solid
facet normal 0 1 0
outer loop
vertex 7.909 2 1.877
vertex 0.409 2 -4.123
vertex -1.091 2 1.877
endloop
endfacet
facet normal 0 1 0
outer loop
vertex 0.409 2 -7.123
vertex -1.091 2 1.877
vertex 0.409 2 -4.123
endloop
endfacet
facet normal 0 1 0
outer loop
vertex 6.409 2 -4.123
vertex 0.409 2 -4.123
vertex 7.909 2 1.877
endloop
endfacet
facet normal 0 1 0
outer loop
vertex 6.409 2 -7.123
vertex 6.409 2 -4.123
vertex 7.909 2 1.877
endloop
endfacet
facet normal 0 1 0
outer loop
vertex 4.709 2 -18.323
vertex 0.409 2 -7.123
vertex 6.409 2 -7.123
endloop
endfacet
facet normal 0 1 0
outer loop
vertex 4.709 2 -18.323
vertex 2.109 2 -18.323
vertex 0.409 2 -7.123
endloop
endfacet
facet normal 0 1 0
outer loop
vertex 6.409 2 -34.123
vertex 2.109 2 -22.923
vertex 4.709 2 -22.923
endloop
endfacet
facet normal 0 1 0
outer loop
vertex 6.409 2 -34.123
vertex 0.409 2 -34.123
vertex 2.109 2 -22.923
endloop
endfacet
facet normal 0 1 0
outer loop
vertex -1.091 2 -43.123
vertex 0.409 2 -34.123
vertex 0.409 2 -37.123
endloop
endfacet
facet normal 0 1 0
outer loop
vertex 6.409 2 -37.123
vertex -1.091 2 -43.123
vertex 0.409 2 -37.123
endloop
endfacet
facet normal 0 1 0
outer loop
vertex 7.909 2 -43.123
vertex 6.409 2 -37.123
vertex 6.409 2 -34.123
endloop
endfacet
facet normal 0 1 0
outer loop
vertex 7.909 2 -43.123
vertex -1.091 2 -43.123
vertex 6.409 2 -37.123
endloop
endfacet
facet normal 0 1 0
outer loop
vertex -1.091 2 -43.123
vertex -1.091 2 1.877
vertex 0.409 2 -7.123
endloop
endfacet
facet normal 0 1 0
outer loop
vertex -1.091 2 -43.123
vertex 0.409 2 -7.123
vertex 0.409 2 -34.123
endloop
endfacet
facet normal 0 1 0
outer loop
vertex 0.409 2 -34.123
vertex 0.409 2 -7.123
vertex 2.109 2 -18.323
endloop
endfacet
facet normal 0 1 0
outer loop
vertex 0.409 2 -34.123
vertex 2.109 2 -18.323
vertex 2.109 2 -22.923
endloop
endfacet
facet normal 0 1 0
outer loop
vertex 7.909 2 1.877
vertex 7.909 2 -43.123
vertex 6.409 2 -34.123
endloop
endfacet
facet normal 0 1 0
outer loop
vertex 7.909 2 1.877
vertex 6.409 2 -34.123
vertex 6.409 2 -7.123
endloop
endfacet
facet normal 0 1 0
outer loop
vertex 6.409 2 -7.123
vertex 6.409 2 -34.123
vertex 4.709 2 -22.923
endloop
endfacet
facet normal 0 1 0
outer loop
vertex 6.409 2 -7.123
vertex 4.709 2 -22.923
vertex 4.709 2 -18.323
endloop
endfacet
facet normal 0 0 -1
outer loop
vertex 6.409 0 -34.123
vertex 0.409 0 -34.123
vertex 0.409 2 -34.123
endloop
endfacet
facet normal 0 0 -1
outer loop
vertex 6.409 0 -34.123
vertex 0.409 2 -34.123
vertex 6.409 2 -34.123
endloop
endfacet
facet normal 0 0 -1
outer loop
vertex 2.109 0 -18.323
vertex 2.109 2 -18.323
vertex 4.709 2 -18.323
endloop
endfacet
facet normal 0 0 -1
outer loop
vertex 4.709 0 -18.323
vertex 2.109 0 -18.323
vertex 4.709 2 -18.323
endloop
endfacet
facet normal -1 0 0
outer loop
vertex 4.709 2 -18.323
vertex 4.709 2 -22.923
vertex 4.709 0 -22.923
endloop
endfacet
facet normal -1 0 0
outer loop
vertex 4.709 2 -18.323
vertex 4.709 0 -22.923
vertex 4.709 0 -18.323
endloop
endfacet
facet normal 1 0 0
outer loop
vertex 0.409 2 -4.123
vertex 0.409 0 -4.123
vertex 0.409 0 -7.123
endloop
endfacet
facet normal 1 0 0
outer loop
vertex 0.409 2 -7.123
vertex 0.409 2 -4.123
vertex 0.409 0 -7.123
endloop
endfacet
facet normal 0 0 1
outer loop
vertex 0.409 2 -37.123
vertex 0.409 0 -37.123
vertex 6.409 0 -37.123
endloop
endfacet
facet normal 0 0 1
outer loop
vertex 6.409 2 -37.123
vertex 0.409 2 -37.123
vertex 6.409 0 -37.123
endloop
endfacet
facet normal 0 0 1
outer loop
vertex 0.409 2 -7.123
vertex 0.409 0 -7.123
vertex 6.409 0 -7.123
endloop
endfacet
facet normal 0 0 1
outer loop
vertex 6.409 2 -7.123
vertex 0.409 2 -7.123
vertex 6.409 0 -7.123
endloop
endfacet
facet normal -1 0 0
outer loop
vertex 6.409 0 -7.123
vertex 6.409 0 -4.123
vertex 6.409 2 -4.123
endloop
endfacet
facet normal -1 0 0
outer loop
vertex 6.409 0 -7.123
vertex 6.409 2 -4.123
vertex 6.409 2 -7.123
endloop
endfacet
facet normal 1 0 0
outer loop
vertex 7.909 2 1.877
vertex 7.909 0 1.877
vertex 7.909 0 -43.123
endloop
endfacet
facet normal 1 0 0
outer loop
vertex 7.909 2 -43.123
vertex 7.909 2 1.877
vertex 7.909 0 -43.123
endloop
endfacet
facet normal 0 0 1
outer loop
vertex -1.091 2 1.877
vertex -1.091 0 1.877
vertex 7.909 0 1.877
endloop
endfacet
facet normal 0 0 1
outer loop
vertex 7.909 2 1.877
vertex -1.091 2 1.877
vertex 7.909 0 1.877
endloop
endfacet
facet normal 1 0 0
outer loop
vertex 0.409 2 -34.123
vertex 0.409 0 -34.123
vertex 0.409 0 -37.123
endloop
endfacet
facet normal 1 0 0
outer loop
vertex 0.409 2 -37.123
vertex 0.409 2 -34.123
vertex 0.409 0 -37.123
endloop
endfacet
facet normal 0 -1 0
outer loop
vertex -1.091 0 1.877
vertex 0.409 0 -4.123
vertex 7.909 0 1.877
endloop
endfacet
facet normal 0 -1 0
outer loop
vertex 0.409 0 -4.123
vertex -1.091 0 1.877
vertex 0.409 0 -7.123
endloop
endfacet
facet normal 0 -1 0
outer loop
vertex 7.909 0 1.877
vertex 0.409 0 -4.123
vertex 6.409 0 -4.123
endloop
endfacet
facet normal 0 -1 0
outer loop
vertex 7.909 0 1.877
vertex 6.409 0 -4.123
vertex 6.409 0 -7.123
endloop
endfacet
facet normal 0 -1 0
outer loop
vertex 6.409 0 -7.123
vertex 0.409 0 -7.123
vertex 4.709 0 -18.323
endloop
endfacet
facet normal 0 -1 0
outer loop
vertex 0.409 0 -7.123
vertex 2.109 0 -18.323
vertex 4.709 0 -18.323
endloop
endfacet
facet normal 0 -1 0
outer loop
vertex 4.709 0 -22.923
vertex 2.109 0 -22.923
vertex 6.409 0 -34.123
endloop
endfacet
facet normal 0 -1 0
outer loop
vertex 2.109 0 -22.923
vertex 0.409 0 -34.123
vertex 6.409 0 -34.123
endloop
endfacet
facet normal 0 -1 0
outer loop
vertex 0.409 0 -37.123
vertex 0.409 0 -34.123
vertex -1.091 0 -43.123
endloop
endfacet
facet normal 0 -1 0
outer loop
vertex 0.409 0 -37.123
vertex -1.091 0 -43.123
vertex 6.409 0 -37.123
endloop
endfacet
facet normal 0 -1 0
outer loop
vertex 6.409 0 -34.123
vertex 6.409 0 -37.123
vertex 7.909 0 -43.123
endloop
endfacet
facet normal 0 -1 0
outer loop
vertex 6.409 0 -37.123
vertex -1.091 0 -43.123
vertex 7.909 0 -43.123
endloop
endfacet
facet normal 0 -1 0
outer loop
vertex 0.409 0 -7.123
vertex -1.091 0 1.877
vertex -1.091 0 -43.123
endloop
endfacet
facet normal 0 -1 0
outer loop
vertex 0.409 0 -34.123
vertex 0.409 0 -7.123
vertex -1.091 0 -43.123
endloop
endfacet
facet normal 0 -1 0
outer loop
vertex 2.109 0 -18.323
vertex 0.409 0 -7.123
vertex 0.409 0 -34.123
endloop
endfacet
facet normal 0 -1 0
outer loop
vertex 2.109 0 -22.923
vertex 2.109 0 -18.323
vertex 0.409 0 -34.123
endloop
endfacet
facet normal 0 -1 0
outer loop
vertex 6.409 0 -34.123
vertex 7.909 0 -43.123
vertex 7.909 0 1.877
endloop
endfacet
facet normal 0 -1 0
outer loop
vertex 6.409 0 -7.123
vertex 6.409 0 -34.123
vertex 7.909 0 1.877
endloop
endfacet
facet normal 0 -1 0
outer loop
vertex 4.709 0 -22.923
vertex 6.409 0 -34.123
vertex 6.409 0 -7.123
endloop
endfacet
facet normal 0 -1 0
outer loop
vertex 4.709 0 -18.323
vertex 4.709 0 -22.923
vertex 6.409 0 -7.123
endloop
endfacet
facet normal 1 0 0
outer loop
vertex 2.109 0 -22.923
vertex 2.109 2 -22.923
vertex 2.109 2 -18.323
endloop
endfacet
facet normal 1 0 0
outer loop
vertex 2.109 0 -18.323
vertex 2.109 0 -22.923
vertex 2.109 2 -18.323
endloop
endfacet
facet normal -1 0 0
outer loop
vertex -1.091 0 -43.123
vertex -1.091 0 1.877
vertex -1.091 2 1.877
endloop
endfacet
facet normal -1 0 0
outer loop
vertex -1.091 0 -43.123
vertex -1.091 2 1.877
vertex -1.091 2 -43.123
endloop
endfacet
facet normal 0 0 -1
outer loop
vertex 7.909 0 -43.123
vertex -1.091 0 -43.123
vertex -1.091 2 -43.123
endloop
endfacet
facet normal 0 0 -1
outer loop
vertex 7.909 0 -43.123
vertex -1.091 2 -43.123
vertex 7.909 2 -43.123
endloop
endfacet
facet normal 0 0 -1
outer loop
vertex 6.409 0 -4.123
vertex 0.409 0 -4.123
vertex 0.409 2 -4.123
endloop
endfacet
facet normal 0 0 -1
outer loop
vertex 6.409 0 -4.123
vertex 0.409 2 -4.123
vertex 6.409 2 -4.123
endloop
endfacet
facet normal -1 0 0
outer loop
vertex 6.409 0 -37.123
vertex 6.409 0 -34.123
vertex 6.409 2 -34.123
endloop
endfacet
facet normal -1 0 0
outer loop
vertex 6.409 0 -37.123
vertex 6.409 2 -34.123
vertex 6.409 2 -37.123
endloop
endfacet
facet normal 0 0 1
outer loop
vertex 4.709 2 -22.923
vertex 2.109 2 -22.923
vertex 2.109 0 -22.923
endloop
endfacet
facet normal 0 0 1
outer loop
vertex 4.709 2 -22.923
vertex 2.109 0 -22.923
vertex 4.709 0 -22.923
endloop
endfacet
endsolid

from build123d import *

# Parameters (mm, degrees)
ESQUISSE1_W                  = 9
ESQUISSE1_H                  = 45
ESQUISSE1_W_2                = 6
ESQUISSE1_H_2                = 3
BOSS_EXTRU_1_DEPTH           = 2
ENL_V_MAT_EXTRU_1_DEPTH      = 44.887394917
ENL_V_MAT_EXTRU_1_DEPTH_BACK = 44.887394917
ESQUISSE2_W                  = 2.6
ESQUISSE2_H                  = 4.6


with BuildPart() as part:
    # Esquisse1 → Boss.-Extru.1 (new body)
    with BuildSketch(Plane(origin=(0, 0, 0), x_dir=(1, 0, 0), z_dir=(0, 1, 0))):
        with Locations((3.408982136, 20.622516556)):
            Rectangle(ESQUISSE1_W, ESQUISSE1_H)
        with Locations((3.408982136, 35.622516556)):
            Rectangle(ESQUISSE1_W_2, ESQUISSE1_H_2, mode=Mode.SUBTRACT)
        with Locations((3.408982136, 5.622516556)):
            Rectangle(ESQUISSE1_W_2, ESQUISSE1_H_2, mode=Mode.SUBTRACT)
    extrude(amount=BOSS_EXTRU_1_DEPTH)

    # Esquisse2 → Enlèv. mat.-Extru.1 (cut, two sides: drawn at the far end of the back side and taken through both)
    with BuildSketch(Plane.XZ.offset(-ENL_V_MAT_EXTRU_1_DEPTH_BACK)):
        with Locations((3.408982136, -20.622516556)):
            Rectangle(ESQUISSE2_W, ESQUISSE2_H)
    extrude(amount=ENL_V_MAT_EXTRU_1_DEPTH + ENL_V_MAT_EXTRU_1_DEPTH_BACK, mode=Mode.SUBTRACT)


solid = part.part
